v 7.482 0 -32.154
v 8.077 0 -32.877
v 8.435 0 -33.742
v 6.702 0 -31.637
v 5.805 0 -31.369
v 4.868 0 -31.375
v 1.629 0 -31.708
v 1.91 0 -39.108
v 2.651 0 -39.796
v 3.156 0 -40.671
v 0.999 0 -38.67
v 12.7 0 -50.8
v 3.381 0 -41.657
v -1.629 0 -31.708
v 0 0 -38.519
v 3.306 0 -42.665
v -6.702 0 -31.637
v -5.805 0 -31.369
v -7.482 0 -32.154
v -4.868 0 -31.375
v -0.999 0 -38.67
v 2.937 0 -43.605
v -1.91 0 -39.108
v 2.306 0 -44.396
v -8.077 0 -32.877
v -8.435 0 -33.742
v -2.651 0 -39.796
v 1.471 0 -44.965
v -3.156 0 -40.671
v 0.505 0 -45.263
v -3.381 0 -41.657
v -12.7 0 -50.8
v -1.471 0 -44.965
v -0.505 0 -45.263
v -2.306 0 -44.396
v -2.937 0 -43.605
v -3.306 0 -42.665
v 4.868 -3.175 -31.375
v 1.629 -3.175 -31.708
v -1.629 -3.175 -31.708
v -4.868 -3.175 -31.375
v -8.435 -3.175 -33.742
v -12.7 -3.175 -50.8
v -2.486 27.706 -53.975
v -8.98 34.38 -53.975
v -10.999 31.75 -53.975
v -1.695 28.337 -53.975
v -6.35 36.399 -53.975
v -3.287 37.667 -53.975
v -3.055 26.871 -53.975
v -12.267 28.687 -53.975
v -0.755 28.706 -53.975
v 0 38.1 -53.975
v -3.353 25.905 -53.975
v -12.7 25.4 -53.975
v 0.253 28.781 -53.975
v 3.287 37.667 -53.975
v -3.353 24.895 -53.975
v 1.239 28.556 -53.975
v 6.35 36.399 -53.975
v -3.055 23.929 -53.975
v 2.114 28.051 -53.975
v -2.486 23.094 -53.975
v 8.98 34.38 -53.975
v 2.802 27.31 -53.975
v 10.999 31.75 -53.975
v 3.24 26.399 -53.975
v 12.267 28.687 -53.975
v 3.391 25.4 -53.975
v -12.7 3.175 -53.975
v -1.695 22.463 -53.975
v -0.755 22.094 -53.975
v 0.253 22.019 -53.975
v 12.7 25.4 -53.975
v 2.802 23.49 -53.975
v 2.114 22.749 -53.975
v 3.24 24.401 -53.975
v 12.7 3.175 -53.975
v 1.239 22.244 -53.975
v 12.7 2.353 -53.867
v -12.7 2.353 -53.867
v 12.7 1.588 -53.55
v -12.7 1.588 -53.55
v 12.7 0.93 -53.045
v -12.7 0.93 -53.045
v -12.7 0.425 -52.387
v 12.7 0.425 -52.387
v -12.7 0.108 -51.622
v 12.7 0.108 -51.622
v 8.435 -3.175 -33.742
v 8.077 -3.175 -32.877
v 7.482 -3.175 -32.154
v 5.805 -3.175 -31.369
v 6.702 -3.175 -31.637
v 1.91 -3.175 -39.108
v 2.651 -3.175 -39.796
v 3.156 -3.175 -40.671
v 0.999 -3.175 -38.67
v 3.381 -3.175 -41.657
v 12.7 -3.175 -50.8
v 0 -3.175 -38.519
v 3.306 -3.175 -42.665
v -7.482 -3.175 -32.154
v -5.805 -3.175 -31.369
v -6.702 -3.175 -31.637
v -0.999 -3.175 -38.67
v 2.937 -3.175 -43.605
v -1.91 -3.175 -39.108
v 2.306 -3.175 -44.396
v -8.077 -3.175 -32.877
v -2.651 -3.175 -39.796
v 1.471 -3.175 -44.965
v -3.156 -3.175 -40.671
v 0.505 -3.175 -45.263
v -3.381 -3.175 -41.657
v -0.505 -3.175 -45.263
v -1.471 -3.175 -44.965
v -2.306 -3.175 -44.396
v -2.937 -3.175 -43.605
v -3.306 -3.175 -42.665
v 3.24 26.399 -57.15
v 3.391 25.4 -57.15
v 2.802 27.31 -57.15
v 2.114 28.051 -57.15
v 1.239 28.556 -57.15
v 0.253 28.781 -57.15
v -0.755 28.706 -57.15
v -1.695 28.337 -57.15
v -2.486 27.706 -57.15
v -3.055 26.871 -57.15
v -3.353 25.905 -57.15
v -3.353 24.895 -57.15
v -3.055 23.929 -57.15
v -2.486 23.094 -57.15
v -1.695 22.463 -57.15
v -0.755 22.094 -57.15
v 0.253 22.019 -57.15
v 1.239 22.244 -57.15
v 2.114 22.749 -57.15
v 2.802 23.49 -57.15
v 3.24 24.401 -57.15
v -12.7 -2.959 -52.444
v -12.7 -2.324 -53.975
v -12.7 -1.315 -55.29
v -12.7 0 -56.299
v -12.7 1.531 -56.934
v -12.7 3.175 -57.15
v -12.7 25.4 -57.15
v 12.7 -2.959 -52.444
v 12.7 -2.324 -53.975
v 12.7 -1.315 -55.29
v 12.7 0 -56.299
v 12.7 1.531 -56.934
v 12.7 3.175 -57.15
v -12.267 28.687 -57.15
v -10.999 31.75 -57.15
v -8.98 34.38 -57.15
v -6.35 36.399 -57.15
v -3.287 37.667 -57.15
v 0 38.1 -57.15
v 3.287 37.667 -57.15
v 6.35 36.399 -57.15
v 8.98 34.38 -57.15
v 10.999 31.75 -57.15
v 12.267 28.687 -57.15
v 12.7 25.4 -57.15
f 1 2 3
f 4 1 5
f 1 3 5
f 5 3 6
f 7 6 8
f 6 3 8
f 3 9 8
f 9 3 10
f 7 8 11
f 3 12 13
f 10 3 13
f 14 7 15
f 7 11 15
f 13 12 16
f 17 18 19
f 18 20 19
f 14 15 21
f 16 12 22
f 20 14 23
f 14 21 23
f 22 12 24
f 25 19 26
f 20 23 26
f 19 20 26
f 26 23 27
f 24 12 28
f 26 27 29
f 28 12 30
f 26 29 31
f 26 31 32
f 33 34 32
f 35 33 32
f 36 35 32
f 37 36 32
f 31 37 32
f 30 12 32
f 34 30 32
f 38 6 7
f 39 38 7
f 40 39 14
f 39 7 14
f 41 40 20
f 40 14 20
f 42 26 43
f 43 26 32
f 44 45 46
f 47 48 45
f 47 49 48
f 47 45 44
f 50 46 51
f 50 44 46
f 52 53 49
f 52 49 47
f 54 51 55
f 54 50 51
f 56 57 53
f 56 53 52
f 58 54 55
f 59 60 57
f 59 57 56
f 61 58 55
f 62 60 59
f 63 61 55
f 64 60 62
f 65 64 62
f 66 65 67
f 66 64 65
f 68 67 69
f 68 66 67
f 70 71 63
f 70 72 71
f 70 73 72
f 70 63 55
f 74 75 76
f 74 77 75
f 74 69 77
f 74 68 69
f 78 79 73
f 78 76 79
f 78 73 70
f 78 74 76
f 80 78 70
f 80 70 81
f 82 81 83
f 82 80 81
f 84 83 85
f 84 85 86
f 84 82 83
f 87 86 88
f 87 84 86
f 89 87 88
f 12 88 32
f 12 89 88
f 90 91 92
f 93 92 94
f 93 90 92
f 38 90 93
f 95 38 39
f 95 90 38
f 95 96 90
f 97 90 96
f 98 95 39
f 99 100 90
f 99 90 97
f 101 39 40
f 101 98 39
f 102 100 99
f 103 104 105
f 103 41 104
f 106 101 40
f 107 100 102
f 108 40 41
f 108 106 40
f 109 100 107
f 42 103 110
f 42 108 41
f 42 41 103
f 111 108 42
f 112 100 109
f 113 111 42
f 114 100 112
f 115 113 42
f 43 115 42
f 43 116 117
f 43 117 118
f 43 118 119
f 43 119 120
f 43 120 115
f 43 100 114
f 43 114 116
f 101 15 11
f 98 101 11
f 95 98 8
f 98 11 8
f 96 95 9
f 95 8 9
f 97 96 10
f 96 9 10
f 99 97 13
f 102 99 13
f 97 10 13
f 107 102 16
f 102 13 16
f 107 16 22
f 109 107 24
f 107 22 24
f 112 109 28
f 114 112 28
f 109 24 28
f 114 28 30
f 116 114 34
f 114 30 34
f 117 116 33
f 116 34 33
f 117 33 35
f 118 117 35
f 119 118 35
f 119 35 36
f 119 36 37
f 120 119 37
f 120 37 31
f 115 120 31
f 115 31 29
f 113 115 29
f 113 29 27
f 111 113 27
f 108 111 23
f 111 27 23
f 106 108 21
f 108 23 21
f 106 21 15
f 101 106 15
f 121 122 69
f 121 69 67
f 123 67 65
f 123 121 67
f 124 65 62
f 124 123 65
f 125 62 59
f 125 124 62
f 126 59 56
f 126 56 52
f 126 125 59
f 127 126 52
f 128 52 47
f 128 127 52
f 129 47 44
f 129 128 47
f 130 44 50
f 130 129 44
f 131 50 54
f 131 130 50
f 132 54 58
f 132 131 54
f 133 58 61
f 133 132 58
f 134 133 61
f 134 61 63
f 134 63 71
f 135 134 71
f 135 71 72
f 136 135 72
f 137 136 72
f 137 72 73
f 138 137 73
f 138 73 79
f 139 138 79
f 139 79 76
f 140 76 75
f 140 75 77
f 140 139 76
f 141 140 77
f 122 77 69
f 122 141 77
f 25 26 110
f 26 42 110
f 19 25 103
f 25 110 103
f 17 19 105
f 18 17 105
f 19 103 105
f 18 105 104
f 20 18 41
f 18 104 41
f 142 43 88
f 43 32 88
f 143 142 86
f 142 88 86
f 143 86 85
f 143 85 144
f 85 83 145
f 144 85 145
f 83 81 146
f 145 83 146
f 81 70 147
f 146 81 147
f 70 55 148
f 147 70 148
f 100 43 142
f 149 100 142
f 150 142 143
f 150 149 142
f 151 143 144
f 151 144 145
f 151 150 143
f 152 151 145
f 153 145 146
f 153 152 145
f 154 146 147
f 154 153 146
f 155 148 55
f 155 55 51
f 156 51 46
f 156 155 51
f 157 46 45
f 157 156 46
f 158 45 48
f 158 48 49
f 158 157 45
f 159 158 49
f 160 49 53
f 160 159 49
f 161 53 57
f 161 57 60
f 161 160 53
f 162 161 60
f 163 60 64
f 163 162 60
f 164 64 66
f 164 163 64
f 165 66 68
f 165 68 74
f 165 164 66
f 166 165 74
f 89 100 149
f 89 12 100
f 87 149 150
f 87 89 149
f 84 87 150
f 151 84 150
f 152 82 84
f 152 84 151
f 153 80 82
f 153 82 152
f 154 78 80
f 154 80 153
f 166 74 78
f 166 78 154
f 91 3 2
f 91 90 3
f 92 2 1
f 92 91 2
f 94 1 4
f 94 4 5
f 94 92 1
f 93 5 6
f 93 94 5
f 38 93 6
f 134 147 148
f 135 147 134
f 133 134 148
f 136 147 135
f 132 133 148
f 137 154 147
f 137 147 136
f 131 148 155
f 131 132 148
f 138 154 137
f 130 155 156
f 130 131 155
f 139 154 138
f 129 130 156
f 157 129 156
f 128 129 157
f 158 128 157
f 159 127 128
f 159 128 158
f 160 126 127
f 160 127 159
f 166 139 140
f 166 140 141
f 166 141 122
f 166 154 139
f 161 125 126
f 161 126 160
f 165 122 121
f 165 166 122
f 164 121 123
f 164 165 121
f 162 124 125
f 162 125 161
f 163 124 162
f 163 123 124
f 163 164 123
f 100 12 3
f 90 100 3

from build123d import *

# Parameters (mm, degrees)
SKETCH1_R          = 3.3909
BASE_FLANGE1_DEPTH = 3.175
EDGE_FLANGE1_DEPTH = 25.4
FILLET1_R          = 3.175
HOLE2_START        = -57.15
HOLE2_OUTLINE_R    = 3.3909
HOLE2_DEPTH        = 3.175
CUT_EXTRUDE1_DEPTH = 48.842508784


# Read off the part's stored shape, not the designer's step: Hole2
# Sheet-metal steps are written as plain solids
with BuildPart() as part:
    # Sketch1 → Base-Flange1 (new body)
    with BuildSketch(Plane(origin=(0, 0, 0), x_dir=(1, 0, 0), z_dir=(0, 1, 0))):
        with BuildLine():
            Line((-12.7, 50.8), (12.7, 50.8))
            Line((12.7, 50.8), (7.700506095, 30.80202438))
            ThreePointArc((7.700506095, 30.80202438), (0, 31.75), (-7.700506095, 30.80202438))
            Line((-7.700506095, 30.80202438), (-12.7, 50.8))
        make_face()
        with Locations(Location((0, 41.91, 0), (0, 0, 270))):
            Circle(SKETCH1_R, mode=Mode.SUBTRACT)
    extrude(amount=-BASE_FLANGE1_DEPTH)

    # Edge-Flange1 section (across the edge) → Edge-Flange1 (add)
    with BuildSketch(Plane(origin=(12.7, 0, -53.975), x_dir=(0, 0, 1), z_dir=(-1, 0, 0))):
        with BuildLine():
            Line((-3.175, 3.175), (-3.175, 38.227))
            Line((-3.175, 38.227), (0, 38.227))
            Line((0, 38.227), (0, 3.175))
            ThreePointArc((0, 3.175), (0.92993597, 0.92993597), (3.175, 0))
            Line((3.175, 0), (3.175, -3.175))
            ThreePointArc((3.175, -3.175), (-1.315128061, -1.315128061), (-3.175, 3.175))
        make_face()
    extrude(amount=EDGE_FLANGE1_DEPTH)

    # Fillet1
    fillet1_edges = [part.edges().sort_by_distance(p)[0] for p in [
        (7.700506095, -1.5875, -30.80202438),
        (-7.700506095, -1.5875, -30.80202438),
    ]]
    fillet(fillet1_edges, radius=FILLET1_R)

    # Hole2 outline → Hole2 (cut)
    with BuildSketch(Plane.XY.offset(HOLE2_START)):
        with Locations((0, 25.4)):
            Circle(HOLE2_OUTLINE_R)
    extrude(amount=HOLE2_DEPTH, mode=Mode.SUBTRACT)

    # Sketch11 → Cut-Extrude1 (cut, through all)
    with BuildSketch(Plane(origin=(0, 0, -57.15), x_dir=(-1, 0, 0), z_dir=(0, 0, -1))):
        with BuildLine():
            Line((-12.7, 25.4), (-12.7, 38.227))
            Line((-12.7, 38.227), (12.7, 38.227))
            Line((12.7, 38.227), (12.7, 25.4))
            ThreePointArc((12.7, 25.4), (0, 38.1), (-12.7, 25.4))
        make_face()
    extrude(amount=-CUT_EXTRUDE1_DEPTH, mode=Mode.SUBTRACT)


solid = part.part
